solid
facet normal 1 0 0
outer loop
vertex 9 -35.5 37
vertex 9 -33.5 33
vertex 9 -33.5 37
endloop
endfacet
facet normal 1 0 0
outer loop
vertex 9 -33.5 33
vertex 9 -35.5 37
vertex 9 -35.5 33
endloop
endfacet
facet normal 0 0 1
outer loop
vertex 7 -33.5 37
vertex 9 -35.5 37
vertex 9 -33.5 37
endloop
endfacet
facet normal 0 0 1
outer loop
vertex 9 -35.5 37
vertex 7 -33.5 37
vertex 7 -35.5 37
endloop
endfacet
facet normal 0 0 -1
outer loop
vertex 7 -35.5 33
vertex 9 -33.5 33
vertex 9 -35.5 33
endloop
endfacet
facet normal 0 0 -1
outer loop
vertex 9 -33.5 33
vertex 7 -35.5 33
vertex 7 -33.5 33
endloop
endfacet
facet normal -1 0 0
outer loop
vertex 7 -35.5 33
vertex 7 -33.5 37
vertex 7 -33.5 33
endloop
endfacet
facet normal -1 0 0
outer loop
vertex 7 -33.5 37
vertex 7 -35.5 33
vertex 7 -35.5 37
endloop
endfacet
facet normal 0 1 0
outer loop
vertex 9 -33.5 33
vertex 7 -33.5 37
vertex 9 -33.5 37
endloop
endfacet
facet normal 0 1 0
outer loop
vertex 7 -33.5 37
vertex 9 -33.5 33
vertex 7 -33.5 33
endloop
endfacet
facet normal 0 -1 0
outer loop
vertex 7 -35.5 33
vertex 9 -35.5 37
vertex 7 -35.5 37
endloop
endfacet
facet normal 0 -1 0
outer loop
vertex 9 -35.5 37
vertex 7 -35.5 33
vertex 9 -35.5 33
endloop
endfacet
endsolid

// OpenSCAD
// Side zip-tie tab on the holder's side wall (world -X): the bridge
// between its slots, where the lead lies, must be material. Non-empty.
include <../lib.scad>
intersection() {
  mg995_holder();
  translate([side_tie_x - 1, -holder_hw - tie_tab_l / 2 - 1, servo_ear_top + 1]) cube([2, 2, holder_t - 2]);
}
